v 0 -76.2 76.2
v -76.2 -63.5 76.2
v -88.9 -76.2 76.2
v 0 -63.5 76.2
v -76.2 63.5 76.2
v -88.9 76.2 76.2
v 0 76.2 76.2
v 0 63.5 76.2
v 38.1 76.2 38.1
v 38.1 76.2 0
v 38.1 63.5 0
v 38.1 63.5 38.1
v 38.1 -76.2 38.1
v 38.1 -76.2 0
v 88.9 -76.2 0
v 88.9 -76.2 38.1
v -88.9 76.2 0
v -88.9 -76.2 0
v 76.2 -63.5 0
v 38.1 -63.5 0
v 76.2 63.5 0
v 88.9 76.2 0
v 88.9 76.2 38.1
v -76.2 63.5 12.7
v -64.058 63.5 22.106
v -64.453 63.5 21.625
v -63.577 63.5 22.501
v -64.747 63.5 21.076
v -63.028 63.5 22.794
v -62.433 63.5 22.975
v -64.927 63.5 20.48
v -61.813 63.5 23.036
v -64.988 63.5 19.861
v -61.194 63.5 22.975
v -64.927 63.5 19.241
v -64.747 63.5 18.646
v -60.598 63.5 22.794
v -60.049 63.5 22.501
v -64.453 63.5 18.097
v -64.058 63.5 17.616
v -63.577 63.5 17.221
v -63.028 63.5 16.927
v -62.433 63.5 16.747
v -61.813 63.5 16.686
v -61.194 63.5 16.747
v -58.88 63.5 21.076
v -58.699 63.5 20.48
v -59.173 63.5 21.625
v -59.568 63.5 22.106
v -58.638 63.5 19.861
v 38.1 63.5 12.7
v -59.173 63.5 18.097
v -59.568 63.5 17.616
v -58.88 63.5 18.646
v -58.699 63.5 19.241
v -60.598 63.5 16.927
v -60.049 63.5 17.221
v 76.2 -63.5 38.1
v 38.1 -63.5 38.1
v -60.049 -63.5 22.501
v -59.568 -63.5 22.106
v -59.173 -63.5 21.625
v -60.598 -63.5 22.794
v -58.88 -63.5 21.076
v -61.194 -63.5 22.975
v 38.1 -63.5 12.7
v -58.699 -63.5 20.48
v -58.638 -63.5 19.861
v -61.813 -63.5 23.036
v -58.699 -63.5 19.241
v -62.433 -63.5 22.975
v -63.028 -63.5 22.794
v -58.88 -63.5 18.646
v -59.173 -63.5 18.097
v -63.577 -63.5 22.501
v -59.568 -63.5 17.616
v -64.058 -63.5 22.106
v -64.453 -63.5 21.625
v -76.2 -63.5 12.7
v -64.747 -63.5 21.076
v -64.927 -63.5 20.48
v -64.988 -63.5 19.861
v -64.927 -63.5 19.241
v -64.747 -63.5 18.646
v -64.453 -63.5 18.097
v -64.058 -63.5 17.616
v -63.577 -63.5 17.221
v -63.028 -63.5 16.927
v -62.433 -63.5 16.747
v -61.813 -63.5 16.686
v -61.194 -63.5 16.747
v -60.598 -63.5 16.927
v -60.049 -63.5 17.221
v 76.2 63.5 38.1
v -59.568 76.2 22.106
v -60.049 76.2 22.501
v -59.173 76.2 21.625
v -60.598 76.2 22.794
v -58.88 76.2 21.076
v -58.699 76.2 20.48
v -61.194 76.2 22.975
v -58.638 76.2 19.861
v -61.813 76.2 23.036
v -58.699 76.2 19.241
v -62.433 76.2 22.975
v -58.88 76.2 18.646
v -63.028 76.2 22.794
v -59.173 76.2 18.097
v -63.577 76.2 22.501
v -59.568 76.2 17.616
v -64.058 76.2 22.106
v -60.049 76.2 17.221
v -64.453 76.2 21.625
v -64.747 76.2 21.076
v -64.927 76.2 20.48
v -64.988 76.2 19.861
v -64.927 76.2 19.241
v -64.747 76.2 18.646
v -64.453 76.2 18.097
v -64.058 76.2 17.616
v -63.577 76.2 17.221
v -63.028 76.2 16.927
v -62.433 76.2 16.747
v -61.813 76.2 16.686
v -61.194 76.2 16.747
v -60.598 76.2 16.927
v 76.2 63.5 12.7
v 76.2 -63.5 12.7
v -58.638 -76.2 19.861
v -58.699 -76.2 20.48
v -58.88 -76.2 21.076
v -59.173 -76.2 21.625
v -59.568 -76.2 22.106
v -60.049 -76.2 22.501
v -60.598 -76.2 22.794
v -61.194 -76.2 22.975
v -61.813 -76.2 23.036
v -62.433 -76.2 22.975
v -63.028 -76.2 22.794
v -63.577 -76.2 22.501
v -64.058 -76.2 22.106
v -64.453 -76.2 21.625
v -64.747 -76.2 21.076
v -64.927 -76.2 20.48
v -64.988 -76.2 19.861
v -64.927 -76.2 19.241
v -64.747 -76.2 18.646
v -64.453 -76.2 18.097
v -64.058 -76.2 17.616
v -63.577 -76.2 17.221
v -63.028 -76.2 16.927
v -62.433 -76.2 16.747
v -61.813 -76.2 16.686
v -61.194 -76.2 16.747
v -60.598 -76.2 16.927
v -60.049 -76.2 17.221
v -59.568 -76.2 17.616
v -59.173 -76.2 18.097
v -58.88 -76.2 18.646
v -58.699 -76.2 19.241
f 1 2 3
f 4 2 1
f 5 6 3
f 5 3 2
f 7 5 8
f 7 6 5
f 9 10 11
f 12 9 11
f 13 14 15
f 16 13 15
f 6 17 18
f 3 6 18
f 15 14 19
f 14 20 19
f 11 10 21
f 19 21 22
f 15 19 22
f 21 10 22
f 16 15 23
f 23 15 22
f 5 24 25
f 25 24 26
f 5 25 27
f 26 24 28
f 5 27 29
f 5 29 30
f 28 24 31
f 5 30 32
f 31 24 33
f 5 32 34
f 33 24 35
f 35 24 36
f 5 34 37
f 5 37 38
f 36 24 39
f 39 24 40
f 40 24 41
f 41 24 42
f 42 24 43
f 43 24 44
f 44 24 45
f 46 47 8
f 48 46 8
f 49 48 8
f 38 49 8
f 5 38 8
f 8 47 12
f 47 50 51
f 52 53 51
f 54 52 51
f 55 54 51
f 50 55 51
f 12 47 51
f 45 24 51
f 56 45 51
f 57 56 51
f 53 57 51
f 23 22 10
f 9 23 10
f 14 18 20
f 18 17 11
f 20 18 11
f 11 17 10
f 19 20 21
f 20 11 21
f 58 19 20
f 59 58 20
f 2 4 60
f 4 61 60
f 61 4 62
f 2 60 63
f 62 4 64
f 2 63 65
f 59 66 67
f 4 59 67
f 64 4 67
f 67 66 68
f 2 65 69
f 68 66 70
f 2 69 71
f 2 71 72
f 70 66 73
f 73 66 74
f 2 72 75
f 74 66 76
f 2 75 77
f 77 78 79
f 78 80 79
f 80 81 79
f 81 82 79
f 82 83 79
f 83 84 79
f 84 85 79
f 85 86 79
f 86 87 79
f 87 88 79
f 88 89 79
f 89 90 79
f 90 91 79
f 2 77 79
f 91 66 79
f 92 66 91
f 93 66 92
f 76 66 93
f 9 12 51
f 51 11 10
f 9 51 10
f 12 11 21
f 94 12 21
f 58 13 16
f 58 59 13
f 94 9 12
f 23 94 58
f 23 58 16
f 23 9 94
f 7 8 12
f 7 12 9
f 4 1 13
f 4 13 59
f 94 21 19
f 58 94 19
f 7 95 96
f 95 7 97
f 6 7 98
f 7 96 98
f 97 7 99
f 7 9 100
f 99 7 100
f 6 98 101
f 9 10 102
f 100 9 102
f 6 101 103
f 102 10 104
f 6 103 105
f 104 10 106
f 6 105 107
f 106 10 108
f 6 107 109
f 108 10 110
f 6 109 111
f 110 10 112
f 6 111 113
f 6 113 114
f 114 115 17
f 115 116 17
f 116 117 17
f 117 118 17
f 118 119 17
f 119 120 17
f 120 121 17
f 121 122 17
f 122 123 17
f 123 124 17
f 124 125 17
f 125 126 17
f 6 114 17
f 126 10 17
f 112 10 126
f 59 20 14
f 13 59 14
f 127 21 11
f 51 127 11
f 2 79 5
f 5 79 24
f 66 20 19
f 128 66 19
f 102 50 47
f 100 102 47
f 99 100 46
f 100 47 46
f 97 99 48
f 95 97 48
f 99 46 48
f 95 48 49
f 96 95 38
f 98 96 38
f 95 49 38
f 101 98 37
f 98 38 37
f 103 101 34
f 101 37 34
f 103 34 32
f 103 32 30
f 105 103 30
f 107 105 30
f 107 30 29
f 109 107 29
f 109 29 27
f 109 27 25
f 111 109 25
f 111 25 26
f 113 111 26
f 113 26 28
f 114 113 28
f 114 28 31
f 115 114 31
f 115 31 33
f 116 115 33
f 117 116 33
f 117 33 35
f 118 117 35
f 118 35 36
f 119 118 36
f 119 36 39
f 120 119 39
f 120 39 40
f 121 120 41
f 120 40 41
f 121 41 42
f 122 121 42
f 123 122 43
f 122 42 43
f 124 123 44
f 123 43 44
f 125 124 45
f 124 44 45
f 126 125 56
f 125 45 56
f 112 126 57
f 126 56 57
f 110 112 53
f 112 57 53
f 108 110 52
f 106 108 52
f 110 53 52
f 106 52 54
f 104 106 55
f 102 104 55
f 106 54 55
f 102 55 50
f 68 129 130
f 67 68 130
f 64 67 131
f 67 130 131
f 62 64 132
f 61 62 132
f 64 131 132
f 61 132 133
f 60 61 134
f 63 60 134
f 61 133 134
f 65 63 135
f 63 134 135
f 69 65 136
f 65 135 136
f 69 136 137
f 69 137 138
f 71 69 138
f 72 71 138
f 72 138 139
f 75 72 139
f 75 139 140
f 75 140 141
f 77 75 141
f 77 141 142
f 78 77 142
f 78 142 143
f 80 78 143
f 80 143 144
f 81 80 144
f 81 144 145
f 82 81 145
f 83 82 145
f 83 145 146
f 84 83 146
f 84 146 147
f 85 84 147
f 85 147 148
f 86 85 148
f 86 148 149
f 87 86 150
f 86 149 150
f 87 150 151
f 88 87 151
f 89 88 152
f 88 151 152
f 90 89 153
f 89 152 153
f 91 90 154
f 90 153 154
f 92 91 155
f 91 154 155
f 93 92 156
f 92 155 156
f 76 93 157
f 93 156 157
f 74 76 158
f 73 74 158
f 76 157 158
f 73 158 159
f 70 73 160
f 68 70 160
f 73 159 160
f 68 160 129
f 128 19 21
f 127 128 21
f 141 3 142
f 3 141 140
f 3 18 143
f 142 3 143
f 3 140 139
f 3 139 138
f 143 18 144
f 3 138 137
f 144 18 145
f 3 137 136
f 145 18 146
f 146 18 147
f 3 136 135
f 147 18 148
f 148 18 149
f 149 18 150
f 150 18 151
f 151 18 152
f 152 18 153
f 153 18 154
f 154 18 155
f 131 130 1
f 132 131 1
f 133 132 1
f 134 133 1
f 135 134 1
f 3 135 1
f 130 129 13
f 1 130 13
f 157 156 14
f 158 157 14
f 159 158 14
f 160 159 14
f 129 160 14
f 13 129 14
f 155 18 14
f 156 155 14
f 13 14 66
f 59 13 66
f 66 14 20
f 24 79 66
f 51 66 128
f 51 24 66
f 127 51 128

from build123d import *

# Parameters (mm, degrees)
F1_DEPTH = 76.2
F2_DEPTH = 38.1
F3_SIZE  = 38.1
F0_W     = 114.3
F0_H     = 127
F0_W_2   = 38.1
F4_DEPTH = 12.7
F6_D     = 6.35


with BuildPart() as f1:
    # F0 (on Top) → F1 (new body)
    with BuildSketch(Plane.XY):
        Polygon((-88.9, -76.2), (38.1, -76.2), (38.1, -63.5), (-76.2, -63.5), (-76.2, 63.5), (38.1, 63.5), (38.1, 76.2), (-88.9, 76.2), align=None)
    extrude(amount=F1_DEPTH)

    # F3
    f3_edges = [f1.edges().sort_by_distance(p)[0] for p in [
        (38.1, -69.85, 76.2),
        (38.1, 69.85, 76.2),
    ]]
    chamfer(f3_edges, length=F3_SIZE)

    # F0 (on Top) → F4 (join)
    with BuildSketch(Plane.XY):
        with Locations((-19.05, 0)):
            Rectangle(F0_W, F0_H)
        with Locations((57.15, 0)):
            Rectangle(F0_W_2, F0_H)
    extrude(amount=F4_DEPTH)

    # F6 (through all)
    with Locations(Plane(origin=(0, 76.2, 0), x_dir=(-1, 0, 0), z_dir=(0, 1, 0))):
        with Locations((61.8133324465, 19.8607390972)):
            Hole(F6_D / 2)


with BuildPart() as f2:
    # F0 (on Top) → F2 (new body)
    with BuildSketch(Plane.XY):
        Polygon((38.1, -76.2), (88.9, -76.2), (88.9, 76.2), (38.1, 76.2), (38.1, 63.5), (76.2, 63.5), (76.2, -63.5), (38.1, -63.5), align=None)
    extrude(amount=F2_DEPTH)


solid = Compound([f1.part, f2.part])
